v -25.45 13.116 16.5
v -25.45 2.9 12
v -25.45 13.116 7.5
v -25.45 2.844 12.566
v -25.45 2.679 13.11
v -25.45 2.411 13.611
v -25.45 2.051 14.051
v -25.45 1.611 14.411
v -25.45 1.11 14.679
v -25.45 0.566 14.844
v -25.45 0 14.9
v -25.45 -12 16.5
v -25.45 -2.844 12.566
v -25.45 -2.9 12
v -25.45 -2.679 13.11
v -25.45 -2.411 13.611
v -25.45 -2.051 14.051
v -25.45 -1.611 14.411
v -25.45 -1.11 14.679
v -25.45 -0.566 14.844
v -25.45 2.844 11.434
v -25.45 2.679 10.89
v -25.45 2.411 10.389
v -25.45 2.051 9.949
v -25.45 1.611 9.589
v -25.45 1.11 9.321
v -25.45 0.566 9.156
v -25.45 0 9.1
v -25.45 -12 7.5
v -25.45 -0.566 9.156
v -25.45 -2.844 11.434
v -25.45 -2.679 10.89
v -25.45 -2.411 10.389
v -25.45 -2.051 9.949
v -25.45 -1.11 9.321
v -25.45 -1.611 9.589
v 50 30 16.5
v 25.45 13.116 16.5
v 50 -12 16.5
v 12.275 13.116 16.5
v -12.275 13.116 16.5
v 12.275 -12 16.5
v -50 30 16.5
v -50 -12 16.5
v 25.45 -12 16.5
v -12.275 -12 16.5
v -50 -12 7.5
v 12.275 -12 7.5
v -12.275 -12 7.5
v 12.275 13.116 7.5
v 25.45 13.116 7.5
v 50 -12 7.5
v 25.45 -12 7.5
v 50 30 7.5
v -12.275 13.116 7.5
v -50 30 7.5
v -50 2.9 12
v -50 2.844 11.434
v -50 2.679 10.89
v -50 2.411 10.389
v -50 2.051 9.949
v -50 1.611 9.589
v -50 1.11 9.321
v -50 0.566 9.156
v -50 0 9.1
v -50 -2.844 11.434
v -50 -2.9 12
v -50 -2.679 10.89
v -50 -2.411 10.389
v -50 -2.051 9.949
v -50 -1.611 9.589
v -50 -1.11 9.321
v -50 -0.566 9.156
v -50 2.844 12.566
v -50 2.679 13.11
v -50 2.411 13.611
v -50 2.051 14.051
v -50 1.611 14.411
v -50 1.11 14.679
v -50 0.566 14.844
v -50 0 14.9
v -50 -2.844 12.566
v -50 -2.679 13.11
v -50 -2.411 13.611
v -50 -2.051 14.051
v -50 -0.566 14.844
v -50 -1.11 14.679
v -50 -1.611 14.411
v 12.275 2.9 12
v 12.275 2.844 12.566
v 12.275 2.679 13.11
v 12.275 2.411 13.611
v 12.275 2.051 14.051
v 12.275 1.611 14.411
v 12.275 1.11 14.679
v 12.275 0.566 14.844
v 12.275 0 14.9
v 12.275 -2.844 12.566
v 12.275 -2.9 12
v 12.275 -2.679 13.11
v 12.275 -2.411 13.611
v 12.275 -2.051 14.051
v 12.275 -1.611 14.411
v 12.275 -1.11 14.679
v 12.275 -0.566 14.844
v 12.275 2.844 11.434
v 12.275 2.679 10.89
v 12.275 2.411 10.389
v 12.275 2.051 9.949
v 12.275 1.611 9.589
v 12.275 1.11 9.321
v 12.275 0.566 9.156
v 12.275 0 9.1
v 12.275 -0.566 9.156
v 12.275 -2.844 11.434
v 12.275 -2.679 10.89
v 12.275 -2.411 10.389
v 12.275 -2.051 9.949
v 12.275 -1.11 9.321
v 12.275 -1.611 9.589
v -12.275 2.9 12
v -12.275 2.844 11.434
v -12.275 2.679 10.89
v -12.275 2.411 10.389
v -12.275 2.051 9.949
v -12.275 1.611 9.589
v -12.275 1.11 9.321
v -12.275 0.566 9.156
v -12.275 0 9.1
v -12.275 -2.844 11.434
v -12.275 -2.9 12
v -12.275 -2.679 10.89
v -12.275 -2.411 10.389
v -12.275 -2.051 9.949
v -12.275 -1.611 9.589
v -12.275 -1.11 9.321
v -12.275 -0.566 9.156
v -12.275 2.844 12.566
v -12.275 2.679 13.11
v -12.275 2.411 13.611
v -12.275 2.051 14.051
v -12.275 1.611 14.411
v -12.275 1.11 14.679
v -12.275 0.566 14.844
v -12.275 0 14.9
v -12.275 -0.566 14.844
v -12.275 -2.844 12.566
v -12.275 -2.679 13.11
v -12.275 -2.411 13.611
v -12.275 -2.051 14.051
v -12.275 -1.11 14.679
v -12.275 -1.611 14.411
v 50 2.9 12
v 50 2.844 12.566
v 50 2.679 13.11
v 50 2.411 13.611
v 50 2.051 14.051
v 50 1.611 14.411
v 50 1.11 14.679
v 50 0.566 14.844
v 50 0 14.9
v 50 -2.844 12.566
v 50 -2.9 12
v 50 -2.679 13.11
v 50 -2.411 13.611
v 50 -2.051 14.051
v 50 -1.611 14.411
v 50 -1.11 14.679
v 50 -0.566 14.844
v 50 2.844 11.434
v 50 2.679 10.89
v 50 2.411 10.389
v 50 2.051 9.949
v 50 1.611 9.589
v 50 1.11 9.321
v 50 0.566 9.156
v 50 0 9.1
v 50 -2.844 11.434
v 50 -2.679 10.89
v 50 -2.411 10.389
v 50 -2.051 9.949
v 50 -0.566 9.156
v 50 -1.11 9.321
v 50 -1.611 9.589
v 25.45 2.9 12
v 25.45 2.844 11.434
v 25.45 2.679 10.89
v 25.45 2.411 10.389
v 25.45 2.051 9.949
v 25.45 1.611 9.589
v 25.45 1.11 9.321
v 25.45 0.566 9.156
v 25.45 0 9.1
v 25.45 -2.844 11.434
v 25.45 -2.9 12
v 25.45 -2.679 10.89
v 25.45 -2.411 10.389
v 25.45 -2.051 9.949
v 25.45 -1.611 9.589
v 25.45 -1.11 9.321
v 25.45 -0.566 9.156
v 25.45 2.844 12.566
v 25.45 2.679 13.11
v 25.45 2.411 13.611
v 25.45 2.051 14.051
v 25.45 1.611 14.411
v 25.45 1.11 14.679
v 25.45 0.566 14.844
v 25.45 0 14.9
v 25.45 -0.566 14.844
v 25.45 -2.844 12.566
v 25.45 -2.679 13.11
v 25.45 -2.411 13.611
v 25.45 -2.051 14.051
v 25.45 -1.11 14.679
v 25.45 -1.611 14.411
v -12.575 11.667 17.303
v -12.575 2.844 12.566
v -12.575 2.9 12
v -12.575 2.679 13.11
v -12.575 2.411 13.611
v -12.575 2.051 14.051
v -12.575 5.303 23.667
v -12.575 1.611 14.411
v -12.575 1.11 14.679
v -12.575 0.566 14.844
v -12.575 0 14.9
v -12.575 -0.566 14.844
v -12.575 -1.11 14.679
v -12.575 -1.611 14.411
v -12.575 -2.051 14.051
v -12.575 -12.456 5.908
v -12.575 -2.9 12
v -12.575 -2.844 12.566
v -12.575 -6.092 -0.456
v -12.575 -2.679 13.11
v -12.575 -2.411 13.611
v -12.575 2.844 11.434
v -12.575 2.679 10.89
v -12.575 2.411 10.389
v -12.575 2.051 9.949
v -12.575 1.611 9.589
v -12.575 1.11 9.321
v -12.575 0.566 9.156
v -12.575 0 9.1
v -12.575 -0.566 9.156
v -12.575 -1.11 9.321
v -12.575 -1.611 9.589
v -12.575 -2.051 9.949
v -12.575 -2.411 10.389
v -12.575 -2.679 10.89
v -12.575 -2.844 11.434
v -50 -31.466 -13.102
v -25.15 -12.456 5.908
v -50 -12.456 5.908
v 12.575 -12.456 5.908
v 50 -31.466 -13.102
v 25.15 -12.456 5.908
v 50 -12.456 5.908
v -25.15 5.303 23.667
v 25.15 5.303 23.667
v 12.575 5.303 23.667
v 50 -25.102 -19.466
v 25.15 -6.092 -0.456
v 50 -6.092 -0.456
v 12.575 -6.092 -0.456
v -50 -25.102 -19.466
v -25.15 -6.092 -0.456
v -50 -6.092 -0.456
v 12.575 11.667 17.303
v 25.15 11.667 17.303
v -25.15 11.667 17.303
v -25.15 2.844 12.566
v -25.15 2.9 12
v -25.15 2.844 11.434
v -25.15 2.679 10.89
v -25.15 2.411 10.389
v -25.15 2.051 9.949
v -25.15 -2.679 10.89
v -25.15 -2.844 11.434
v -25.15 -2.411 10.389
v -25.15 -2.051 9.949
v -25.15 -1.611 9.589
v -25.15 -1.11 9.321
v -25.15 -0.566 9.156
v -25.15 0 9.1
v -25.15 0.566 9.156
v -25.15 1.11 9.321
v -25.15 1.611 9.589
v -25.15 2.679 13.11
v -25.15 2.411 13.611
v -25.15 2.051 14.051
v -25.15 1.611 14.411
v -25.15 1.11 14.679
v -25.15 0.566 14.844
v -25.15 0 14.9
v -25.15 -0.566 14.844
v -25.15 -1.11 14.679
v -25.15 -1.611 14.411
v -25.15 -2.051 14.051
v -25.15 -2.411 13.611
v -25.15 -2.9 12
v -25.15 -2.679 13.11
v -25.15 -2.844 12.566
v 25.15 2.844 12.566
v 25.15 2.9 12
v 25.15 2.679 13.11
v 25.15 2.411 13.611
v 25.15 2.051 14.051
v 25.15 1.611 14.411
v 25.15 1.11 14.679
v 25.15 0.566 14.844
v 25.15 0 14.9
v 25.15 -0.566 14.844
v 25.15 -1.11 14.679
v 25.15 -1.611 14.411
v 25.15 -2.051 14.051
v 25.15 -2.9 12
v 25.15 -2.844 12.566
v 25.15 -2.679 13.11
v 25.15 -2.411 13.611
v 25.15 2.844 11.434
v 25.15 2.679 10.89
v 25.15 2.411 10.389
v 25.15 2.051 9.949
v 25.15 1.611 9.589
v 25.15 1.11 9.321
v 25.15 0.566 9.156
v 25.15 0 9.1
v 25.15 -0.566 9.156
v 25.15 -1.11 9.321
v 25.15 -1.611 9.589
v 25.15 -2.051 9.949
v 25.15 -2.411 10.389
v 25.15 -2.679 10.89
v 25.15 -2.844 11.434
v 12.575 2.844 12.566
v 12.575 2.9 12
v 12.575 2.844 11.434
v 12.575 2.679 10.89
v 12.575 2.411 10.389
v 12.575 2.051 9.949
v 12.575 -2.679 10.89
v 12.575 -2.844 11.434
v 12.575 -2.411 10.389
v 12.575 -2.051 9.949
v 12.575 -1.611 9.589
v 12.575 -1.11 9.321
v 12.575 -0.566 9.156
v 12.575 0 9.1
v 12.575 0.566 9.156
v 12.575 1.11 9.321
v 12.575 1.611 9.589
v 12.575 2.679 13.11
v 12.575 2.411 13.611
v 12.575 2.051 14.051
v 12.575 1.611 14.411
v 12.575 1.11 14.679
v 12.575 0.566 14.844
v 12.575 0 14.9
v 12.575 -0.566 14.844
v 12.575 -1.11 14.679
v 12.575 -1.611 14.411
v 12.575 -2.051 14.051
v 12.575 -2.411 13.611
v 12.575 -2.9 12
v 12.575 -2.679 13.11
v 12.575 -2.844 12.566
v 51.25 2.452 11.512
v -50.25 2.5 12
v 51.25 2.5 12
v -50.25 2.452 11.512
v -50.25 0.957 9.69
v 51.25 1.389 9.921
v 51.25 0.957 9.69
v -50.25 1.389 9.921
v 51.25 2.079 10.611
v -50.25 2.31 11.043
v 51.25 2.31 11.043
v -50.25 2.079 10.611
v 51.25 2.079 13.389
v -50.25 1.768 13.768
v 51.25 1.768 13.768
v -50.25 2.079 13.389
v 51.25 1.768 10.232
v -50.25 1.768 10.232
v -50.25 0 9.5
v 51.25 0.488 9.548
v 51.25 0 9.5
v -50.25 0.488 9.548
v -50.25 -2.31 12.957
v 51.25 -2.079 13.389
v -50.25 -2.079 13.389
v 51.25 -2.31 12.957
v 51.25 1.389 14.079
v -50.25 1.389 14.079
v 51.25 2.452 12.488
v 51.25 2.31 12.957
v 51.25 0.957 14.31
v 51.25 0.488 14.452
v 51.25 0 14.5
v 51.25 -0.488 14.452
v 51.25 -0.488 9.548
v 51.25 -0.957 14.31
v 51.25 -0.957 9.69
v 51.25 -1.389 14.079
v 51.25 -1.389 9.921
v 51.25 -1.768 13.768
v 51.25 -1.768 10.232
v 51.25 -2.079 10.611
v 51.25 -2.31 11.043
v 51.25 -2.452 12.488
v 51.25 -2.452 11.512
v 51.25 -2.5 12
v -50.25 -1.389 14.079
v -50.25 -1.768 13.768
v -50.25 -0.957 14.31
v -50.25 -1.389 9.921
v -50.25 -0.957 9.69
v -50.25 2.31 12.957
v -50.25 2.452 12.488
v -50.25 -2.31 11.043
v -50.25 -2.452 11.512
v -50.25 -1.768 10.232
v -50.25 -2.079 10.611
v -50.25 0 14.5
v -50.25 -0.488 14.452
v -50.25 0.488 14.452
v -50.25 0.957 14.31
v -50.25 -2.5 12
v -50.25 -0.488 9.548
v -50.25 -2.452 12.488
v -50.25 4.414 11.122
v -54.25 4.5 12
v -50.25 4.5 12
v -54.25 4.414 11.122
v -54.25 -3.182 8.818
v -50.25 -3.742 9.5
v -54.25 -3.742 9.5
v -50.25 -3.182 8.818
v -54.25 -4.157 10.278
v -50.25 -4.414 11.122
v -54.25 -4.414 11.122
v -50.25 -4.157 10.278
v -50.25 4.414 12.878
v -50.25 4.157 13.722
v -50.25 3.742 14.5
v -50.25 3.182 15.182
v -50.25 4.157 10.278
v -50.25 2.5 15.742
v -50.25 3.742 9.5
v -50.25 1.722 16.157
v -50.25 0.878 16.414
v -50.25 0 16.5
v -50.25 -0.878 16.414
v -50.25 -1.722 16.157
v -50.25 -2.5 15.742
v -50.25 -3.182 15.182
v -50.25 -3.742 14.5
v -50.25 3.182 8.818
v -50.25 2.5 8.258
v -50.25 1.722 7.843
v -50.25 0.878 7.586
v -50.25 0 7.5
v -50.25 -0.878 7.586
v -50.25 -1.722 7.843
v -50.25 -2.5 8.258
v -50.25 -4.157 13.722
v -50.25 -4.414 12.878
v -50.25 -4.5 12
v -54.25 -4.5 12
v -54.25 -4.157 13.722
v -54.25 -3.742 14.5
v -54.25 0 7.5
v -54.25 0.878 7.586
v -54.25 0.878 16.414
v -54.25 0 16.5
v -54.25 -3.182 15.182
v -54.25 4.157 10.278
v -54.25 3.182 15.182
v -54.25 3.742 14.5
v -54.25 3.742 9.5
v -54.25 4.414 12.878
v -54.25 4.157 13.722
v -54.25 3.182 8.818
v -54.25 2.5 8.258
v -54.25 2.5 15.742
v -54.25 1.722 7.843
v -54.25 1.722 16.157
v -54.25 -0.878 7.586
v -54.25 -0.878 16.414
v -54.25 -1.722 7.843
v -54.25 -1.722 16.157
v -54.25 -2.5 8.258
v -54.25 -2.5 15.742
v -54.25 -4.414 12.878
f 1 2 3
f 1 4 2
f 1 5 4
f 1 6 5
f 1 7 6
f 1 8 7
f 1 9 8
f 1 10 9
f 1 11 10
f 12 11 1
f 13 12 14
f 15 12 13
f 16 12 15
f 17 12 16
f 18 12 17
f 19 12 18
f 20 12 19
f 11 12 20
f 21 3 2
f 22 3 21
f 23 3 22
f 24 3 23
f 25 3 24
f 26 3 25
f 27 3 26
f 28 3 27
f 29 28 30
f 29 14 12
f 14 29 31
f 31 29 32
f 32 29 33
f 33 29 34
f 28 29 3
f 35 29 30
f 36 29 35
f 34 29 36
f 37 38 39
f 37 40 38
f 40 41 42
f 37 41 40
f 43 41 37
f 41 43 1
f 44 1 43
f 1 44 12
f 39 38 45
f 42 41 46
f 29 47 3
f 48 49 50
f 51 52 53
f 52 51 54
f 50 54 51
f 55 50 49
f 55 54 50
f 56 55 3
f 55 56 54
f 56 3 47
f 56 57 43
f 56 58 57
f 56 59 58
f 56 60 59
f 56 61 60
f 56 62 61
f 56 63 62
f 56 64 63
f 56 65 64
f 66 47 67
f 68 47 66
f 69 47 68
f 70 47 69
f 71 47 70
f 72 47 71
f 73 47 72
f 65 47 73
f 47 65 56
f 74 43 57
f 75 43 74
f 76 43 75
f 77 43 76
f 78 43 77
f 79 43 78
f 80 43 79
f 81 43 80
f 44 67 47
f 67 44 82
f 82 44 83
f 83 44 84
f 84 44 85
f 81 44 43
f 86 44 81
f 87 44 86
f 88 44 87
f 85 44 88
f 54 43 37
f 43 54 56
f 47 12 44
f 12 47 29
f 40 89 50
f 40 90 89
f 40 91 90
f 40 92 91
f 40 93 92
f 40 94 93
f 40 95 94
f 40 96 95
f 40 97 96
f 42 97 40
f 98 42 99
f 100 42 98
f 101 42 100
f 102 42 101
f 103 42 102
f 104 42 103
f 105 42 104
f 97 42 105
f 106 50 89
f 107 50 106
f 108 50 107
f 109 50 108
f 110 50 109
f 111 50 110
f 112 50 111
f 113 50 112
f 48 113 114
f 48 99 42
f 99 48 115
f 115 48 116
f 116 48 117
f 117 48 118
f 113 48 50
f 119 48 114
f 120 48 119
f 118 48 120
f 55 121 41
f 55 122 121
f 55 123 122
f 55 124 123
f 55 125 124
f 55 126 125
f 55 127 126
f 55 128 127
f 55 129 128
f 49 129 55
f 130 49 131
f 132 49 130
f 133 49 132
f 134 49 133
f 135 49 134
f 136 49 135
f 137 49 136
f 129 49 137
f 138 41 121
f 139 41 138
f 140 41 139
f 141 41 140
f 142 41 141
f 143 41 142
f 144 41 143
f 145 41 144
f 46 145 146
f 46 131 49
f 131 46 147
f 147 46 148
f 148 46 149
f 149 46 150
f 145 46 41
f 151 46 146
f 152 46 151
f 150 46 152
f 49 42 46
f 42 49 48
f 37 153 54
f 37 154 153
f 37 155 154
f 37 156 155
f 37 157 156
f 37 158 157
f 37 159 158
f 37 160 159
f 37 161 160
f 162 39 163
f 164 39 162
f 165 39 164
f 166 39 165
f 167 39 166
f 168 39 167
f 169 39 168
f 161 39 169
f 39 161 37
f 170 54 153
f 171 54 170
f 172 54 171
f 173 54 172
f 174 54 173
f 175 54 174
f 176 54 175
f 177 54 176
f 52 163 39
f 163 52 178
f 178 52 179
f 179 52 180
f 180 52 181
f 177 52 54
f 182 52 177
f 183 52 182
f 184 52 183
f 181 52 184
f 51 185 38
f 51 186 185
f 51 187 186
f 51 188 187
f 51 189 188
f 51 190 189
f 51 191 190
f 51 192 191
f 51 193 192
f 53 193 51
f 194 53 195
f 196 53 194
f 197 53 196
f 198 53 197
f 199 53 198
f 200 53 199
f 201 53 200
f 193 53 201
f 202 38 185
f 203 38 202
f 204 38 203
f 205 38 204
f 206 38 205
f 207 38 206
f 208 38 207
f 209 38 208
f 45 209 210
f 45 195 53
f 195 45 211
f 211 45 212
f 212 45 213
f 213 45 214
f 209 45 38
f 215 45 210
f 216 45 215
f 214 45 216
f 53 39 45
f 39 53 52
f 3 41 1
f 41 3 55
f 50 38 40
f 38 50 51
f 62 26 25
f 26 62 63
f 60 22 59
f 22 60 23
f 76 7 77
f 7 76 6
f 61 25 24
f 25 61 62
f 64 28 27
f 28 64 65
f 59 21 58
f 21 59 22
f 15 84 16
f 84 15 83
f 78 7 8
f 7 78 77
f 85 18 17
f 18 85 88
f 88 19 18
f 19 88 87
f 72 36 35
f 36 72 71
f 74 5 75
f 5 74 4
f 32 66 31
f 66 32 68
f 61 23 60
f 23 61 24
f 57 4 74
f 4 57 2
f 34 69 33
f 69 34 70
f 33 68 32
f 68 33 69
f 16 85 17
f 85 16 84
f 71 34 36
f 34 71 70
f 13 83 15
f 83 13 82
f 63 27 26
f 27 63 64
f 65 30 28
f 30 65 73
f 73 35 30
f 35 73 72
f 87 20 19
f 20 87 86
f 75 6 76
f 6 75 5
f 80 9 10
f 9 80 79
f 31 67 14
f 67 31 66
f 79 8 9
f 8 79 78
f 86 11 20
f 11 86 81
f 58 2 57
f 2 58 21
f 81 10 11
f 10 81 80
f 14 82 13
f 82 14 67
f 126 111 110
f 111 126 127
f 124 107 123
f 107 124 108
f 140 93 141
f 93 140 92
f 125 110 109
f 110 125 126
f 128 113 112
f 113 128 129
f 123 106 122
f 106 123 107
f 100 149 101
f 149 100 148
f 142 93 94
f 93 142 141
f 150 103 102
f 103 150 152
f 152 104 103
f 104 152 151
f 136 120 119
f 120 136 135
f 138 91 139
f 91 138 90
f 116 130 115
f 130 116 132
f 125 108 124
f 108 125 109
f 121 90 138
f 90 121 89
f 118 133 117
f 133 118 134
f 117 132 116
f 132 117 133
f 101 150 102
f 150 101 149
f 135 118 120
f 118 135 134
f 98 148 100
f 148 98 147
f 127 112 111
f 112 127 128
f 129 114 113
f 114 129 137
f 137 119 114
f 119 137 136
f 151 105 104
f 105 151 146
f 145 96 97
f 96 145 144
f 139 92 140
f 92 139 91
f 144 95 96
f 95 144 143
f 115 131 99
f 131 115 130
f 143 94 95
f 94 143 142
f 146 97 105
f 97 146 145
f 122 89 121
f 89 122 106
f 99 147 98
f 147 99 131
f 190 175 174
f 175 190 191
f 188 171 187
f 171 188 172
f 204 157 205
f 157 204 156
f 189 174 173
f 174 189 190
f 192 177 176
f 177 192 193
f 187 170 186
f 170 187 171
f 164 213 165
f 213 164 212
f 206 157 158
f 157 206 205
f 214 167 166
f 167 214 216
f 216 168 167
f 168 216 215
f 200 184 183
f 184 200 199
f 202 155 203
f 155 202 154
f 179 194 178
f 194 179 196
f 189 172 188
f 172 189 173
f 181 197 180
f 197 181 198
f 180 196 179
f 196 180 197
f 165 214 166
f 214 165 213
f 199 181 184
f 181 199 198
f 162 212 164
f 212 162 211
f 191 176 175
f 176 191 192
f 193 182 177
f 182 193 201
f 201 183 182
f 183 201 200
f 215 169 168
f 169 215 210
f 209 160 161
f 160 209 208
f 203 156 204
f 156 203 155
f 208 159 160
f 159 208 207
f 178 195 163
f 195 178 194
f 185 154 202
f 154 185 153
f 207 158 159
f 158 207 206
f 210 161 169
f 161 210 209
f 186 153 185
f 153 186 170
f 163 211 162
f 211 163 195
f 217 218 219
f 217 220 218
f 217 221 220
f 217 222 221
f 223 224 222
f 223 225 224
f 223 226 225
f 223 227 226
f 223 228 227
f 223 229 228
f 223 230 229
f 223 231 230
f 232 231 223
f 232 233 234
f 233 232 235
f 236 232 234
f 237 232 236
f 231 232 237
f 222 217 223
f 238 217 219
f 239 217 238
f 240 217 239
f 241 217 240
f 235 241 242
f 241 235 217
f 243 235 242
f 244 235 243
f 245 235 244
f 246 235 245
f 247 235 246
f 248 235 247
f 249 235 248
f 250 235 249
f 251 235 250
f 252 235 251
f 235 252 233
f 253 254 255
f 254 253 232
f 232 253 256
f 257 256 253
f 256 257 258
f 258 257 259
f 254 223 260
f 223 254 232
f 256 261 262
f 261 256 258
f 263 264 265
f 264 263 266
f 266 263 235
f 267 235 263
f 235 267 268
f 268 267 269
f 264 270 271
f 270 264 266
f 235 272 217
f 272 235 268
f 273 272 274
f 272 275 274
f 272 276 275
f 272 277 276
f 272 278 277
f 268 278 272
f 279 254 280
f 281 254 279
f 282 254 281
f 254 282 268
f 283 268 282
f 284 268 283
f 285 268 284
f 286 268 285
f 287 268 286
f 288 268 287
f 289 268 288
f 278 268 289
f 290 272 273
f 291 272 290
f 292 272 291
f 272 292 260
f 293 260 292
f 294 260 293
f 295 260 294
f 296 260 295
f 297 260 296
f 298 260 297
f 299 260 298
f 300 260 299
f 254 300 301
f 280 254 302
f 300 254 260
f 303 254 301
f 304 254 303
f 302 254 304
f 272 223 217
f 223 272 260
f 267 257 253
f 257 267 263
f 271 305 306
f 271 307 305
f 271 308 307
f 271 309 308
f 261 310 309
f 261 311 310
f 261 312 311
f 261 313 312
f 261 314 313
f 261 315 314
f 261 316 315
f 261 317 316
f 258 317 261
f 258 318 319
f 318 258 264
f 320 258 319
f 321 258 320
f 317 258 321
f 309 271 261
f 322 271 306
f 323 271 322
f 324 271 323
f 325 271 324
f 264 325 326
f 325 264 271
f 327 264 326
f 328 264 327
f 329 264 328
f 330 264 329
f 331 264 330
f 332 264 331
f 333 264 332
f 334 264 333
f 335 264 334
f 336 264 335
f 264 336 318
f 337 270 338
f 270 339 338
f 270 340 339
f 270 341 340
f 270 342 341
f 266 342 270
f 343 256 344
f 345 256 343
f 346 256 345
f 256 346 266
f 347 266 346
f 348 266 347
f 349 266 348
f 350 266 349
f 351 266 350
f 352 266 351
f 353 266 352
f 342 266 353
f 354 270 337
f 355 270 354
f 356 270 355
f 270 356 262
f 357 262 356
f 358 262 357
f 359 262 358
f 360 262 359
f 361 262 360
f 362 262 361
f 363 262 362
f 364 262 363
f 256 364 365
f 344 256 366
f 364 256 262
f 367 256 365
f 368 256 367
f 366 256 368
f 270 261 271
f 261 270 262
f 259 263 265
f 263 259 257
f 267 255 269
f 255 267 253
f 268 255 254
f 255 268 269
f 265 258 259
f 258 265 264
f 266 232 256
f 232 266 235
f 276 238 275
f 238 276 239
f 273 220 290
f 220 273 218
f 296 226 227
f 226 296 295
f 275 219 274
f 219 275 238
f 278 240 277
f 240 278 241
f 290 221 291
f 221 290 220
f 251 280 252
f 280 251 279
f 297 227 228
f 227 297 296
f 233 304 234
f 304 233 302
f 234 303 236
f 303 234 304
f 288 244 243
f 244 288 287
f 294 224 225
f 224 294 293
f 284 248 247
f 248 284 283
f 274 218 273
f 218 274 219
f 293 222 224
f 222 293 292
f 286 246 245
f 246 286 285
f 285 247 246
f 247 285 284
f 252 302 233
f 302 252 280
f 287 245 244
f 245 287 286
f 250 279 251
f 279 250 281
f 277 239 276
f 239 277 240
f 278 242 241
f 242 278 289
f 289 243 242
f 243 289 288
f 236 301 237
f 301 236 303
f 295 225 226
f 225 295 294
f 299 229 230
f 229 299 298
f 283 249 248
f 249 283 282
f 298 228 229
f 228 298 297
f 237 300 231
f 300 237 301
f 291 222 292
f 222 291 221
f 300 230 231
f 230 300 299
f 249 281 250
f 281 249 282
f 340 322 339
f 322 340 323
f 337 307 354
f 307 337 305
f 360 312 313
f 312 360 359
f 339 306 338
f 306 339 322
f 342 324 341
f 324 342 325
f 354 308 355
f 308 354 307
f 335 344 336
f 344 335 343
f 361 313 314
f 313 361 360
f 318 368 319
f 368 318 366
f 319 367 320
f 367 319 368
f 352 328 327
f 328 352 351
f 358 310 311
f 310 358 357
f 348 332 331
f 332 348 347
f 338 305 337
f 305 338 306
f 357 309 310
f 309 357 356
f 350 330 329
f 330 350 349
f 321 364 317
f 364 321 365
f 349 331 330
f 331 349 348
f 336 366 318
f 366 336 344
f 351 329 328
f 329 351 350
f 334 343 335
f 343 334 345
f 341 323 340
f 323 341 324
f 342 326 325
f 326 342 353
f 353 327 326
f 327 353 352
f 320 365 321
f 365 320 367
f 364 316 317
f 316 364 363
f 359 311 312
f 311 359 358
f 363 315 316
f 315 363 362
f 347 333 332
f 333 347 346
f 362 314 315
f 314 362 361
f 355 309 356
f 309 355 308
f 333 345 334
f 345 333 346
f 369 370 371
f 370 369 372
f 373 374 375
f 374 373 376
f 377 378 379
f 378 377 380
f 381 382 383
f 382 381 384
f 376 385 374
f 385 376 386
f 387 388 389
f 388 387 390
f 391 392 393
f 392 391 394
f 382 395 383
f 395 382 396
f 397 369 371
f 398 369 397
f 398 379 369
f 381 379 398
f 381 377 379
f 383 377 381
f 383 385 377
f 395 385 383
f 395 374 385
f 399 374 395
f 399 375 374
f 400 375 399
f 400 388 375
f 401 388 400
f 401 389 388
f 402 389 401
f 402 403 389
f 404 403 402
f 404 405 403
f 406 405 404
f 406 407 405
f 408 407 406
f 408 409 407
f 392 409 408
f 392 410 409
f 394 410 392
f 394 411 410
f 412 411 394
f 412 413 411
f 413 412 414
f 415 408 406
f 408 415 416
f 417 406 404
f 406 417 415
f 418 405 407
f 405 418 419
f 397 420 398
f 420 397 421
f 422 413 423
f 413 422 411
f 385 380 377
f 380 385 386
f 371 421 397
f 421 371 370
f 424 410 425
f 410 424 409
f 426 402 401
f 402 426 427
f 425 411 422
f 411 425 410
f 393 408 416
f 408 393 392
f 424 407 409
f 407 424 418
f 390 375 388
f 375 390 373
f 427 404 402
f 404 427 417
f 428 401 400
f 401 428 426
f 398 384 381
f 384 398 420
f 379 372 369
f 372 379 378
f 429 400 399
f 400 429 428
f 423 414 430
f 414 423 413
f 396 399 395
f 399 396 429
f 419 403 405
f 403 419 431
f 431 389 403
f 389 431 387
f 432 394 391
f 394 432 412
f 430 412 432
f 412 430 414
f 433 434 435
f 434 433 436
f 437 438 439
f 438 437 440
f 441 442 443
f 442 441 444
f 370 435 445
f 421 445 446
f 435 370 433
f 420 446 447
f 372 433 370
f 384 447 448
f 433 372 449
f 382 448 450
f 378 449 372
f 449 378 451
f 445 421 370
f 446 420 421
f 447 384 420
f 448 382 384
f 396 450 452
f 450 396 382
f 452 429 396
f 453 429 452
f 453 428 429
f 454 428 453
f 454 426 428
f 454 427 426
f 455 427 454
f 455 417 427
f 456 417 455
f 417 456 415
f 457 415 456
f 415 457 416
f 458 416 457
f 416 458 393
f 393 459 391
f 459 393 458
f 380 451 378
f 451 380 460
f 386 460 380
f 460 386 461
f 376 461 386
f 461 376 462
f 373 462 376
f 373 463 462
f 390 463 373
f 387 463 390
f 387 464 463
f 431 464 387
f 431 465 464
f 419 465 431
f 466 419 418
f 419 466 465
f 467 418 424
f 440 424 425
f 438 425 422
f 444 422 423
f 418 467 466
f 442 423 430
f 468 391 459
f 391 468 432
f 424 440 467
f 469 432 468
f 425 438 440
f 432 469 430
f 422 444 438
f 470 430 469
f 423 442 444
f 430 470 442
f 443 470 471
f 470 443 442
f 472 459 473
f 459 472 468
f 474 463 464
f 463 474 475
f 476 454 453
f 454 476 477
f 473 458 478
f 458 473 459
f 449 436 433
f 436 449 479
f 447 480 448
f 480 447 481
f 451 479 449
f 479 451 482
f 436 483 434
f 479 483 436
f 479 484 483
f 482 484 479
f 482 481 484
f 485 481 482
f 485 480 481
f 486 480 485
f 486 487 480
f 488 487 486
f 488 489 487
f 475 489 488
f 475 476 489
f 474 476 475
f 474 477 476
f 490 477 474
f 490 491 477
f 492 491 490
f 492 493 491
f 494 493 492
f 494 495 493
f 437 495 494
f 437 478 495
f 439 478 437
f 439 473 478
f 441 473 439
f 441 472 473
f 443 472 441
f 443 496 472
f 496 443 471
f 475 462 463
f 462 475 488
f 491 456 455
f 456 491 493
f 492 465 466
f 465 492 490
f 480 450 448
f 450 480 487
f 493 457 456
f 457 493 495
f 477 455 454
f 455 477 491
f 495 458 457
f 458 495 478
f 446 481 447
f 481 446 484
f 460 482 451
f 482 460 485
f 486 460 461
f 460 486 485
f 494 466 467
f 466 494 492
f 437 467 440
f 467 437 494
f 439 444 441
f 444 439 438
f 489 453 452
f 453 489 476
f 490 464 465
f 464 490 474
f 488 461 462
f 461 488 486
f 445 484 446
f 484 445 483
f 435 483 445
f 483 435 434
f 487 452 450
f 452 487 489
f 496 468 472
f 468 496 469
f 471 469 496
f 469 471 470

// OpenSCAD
$fn = 32;

// ------------------------------------------------------------------------
// Butt hinge: hinge 100 mm, leaf swung 45 deg
// Every part is its own module, assembly() places every instance.
// ------------------------------------------------------------------------

// --- part 1 ---
module hinge_base() {
  difference() {
    union() {
      translate([-50, -12, -4.5]) cube([24.55, 42, 9]);
      translate([-12.275, -12, -4.5]) cube([24.55, 42, 9]);
      translate([25.45, -12, -4.5]) cube([24.55, 42, 9]);
      translate([-50, 13.116, -4.5]) cube([100, 16.884, 9]);
    }
    translate([-37.725, 0, 0]) rotate([0, 90, 0]) cylinder(h = 26.55, d = 5.8, center = true);
    translate([0, 0, 0]) rotate([0, 90, 0]) cylinder(h = 26.55, d = 5.8, center = true);
    translate([37.725, 0, 0]) rotate([0, 90, 0]) cylinder(h = 26.55, d = 5.8, center = true);
  }
}

// --- part 2 ---
module hinge_mover() {
  difference() {
    union() {
      translate([-25.15, -40, -4.5]) cube([12.575, 52, 9]);
      translate([12.575, -40, -4.5]) cube([12.575, 52, 9]);
      translate([-50, -40, -4.5]) cube([100, 26.884, 9]);
    }
    translate([-18.863, 0, 0]) rotate([0, 90, 0]) cylinder(h = 14.575, d = 5.8, center = true);
    translate([18.863, 0, 0]) rotate([0, 90, 0]) cylinder(h = 14.575, d = 5.8, center = true);
  }
}

// --- part 3 ---
module hinge_pin() {
  rotate([0, 90, 0]) cylinder(h = 102.5, d = 5, center = true);
  translate([-54.25, 0, 0]) rotate([0, 90, 0]) cylinder(h = 4, d = 9);
}

// --- assembly ---
module assembly() {
  color([0.80, 0.24, 0.20]) translate([0, 0, 12]) rotate([0, 0, 0]) hinge_base();
  color([0.20, 0.45, 0.75]) translate([0, 0, 12]) rotate([45, 0, 0]) hinge_mover();
  color([0.25, 0.62, 0.32]) translate([0, 0, 12]) rotate([0, 0, 0]) hinge_pin();
}

assembly();
